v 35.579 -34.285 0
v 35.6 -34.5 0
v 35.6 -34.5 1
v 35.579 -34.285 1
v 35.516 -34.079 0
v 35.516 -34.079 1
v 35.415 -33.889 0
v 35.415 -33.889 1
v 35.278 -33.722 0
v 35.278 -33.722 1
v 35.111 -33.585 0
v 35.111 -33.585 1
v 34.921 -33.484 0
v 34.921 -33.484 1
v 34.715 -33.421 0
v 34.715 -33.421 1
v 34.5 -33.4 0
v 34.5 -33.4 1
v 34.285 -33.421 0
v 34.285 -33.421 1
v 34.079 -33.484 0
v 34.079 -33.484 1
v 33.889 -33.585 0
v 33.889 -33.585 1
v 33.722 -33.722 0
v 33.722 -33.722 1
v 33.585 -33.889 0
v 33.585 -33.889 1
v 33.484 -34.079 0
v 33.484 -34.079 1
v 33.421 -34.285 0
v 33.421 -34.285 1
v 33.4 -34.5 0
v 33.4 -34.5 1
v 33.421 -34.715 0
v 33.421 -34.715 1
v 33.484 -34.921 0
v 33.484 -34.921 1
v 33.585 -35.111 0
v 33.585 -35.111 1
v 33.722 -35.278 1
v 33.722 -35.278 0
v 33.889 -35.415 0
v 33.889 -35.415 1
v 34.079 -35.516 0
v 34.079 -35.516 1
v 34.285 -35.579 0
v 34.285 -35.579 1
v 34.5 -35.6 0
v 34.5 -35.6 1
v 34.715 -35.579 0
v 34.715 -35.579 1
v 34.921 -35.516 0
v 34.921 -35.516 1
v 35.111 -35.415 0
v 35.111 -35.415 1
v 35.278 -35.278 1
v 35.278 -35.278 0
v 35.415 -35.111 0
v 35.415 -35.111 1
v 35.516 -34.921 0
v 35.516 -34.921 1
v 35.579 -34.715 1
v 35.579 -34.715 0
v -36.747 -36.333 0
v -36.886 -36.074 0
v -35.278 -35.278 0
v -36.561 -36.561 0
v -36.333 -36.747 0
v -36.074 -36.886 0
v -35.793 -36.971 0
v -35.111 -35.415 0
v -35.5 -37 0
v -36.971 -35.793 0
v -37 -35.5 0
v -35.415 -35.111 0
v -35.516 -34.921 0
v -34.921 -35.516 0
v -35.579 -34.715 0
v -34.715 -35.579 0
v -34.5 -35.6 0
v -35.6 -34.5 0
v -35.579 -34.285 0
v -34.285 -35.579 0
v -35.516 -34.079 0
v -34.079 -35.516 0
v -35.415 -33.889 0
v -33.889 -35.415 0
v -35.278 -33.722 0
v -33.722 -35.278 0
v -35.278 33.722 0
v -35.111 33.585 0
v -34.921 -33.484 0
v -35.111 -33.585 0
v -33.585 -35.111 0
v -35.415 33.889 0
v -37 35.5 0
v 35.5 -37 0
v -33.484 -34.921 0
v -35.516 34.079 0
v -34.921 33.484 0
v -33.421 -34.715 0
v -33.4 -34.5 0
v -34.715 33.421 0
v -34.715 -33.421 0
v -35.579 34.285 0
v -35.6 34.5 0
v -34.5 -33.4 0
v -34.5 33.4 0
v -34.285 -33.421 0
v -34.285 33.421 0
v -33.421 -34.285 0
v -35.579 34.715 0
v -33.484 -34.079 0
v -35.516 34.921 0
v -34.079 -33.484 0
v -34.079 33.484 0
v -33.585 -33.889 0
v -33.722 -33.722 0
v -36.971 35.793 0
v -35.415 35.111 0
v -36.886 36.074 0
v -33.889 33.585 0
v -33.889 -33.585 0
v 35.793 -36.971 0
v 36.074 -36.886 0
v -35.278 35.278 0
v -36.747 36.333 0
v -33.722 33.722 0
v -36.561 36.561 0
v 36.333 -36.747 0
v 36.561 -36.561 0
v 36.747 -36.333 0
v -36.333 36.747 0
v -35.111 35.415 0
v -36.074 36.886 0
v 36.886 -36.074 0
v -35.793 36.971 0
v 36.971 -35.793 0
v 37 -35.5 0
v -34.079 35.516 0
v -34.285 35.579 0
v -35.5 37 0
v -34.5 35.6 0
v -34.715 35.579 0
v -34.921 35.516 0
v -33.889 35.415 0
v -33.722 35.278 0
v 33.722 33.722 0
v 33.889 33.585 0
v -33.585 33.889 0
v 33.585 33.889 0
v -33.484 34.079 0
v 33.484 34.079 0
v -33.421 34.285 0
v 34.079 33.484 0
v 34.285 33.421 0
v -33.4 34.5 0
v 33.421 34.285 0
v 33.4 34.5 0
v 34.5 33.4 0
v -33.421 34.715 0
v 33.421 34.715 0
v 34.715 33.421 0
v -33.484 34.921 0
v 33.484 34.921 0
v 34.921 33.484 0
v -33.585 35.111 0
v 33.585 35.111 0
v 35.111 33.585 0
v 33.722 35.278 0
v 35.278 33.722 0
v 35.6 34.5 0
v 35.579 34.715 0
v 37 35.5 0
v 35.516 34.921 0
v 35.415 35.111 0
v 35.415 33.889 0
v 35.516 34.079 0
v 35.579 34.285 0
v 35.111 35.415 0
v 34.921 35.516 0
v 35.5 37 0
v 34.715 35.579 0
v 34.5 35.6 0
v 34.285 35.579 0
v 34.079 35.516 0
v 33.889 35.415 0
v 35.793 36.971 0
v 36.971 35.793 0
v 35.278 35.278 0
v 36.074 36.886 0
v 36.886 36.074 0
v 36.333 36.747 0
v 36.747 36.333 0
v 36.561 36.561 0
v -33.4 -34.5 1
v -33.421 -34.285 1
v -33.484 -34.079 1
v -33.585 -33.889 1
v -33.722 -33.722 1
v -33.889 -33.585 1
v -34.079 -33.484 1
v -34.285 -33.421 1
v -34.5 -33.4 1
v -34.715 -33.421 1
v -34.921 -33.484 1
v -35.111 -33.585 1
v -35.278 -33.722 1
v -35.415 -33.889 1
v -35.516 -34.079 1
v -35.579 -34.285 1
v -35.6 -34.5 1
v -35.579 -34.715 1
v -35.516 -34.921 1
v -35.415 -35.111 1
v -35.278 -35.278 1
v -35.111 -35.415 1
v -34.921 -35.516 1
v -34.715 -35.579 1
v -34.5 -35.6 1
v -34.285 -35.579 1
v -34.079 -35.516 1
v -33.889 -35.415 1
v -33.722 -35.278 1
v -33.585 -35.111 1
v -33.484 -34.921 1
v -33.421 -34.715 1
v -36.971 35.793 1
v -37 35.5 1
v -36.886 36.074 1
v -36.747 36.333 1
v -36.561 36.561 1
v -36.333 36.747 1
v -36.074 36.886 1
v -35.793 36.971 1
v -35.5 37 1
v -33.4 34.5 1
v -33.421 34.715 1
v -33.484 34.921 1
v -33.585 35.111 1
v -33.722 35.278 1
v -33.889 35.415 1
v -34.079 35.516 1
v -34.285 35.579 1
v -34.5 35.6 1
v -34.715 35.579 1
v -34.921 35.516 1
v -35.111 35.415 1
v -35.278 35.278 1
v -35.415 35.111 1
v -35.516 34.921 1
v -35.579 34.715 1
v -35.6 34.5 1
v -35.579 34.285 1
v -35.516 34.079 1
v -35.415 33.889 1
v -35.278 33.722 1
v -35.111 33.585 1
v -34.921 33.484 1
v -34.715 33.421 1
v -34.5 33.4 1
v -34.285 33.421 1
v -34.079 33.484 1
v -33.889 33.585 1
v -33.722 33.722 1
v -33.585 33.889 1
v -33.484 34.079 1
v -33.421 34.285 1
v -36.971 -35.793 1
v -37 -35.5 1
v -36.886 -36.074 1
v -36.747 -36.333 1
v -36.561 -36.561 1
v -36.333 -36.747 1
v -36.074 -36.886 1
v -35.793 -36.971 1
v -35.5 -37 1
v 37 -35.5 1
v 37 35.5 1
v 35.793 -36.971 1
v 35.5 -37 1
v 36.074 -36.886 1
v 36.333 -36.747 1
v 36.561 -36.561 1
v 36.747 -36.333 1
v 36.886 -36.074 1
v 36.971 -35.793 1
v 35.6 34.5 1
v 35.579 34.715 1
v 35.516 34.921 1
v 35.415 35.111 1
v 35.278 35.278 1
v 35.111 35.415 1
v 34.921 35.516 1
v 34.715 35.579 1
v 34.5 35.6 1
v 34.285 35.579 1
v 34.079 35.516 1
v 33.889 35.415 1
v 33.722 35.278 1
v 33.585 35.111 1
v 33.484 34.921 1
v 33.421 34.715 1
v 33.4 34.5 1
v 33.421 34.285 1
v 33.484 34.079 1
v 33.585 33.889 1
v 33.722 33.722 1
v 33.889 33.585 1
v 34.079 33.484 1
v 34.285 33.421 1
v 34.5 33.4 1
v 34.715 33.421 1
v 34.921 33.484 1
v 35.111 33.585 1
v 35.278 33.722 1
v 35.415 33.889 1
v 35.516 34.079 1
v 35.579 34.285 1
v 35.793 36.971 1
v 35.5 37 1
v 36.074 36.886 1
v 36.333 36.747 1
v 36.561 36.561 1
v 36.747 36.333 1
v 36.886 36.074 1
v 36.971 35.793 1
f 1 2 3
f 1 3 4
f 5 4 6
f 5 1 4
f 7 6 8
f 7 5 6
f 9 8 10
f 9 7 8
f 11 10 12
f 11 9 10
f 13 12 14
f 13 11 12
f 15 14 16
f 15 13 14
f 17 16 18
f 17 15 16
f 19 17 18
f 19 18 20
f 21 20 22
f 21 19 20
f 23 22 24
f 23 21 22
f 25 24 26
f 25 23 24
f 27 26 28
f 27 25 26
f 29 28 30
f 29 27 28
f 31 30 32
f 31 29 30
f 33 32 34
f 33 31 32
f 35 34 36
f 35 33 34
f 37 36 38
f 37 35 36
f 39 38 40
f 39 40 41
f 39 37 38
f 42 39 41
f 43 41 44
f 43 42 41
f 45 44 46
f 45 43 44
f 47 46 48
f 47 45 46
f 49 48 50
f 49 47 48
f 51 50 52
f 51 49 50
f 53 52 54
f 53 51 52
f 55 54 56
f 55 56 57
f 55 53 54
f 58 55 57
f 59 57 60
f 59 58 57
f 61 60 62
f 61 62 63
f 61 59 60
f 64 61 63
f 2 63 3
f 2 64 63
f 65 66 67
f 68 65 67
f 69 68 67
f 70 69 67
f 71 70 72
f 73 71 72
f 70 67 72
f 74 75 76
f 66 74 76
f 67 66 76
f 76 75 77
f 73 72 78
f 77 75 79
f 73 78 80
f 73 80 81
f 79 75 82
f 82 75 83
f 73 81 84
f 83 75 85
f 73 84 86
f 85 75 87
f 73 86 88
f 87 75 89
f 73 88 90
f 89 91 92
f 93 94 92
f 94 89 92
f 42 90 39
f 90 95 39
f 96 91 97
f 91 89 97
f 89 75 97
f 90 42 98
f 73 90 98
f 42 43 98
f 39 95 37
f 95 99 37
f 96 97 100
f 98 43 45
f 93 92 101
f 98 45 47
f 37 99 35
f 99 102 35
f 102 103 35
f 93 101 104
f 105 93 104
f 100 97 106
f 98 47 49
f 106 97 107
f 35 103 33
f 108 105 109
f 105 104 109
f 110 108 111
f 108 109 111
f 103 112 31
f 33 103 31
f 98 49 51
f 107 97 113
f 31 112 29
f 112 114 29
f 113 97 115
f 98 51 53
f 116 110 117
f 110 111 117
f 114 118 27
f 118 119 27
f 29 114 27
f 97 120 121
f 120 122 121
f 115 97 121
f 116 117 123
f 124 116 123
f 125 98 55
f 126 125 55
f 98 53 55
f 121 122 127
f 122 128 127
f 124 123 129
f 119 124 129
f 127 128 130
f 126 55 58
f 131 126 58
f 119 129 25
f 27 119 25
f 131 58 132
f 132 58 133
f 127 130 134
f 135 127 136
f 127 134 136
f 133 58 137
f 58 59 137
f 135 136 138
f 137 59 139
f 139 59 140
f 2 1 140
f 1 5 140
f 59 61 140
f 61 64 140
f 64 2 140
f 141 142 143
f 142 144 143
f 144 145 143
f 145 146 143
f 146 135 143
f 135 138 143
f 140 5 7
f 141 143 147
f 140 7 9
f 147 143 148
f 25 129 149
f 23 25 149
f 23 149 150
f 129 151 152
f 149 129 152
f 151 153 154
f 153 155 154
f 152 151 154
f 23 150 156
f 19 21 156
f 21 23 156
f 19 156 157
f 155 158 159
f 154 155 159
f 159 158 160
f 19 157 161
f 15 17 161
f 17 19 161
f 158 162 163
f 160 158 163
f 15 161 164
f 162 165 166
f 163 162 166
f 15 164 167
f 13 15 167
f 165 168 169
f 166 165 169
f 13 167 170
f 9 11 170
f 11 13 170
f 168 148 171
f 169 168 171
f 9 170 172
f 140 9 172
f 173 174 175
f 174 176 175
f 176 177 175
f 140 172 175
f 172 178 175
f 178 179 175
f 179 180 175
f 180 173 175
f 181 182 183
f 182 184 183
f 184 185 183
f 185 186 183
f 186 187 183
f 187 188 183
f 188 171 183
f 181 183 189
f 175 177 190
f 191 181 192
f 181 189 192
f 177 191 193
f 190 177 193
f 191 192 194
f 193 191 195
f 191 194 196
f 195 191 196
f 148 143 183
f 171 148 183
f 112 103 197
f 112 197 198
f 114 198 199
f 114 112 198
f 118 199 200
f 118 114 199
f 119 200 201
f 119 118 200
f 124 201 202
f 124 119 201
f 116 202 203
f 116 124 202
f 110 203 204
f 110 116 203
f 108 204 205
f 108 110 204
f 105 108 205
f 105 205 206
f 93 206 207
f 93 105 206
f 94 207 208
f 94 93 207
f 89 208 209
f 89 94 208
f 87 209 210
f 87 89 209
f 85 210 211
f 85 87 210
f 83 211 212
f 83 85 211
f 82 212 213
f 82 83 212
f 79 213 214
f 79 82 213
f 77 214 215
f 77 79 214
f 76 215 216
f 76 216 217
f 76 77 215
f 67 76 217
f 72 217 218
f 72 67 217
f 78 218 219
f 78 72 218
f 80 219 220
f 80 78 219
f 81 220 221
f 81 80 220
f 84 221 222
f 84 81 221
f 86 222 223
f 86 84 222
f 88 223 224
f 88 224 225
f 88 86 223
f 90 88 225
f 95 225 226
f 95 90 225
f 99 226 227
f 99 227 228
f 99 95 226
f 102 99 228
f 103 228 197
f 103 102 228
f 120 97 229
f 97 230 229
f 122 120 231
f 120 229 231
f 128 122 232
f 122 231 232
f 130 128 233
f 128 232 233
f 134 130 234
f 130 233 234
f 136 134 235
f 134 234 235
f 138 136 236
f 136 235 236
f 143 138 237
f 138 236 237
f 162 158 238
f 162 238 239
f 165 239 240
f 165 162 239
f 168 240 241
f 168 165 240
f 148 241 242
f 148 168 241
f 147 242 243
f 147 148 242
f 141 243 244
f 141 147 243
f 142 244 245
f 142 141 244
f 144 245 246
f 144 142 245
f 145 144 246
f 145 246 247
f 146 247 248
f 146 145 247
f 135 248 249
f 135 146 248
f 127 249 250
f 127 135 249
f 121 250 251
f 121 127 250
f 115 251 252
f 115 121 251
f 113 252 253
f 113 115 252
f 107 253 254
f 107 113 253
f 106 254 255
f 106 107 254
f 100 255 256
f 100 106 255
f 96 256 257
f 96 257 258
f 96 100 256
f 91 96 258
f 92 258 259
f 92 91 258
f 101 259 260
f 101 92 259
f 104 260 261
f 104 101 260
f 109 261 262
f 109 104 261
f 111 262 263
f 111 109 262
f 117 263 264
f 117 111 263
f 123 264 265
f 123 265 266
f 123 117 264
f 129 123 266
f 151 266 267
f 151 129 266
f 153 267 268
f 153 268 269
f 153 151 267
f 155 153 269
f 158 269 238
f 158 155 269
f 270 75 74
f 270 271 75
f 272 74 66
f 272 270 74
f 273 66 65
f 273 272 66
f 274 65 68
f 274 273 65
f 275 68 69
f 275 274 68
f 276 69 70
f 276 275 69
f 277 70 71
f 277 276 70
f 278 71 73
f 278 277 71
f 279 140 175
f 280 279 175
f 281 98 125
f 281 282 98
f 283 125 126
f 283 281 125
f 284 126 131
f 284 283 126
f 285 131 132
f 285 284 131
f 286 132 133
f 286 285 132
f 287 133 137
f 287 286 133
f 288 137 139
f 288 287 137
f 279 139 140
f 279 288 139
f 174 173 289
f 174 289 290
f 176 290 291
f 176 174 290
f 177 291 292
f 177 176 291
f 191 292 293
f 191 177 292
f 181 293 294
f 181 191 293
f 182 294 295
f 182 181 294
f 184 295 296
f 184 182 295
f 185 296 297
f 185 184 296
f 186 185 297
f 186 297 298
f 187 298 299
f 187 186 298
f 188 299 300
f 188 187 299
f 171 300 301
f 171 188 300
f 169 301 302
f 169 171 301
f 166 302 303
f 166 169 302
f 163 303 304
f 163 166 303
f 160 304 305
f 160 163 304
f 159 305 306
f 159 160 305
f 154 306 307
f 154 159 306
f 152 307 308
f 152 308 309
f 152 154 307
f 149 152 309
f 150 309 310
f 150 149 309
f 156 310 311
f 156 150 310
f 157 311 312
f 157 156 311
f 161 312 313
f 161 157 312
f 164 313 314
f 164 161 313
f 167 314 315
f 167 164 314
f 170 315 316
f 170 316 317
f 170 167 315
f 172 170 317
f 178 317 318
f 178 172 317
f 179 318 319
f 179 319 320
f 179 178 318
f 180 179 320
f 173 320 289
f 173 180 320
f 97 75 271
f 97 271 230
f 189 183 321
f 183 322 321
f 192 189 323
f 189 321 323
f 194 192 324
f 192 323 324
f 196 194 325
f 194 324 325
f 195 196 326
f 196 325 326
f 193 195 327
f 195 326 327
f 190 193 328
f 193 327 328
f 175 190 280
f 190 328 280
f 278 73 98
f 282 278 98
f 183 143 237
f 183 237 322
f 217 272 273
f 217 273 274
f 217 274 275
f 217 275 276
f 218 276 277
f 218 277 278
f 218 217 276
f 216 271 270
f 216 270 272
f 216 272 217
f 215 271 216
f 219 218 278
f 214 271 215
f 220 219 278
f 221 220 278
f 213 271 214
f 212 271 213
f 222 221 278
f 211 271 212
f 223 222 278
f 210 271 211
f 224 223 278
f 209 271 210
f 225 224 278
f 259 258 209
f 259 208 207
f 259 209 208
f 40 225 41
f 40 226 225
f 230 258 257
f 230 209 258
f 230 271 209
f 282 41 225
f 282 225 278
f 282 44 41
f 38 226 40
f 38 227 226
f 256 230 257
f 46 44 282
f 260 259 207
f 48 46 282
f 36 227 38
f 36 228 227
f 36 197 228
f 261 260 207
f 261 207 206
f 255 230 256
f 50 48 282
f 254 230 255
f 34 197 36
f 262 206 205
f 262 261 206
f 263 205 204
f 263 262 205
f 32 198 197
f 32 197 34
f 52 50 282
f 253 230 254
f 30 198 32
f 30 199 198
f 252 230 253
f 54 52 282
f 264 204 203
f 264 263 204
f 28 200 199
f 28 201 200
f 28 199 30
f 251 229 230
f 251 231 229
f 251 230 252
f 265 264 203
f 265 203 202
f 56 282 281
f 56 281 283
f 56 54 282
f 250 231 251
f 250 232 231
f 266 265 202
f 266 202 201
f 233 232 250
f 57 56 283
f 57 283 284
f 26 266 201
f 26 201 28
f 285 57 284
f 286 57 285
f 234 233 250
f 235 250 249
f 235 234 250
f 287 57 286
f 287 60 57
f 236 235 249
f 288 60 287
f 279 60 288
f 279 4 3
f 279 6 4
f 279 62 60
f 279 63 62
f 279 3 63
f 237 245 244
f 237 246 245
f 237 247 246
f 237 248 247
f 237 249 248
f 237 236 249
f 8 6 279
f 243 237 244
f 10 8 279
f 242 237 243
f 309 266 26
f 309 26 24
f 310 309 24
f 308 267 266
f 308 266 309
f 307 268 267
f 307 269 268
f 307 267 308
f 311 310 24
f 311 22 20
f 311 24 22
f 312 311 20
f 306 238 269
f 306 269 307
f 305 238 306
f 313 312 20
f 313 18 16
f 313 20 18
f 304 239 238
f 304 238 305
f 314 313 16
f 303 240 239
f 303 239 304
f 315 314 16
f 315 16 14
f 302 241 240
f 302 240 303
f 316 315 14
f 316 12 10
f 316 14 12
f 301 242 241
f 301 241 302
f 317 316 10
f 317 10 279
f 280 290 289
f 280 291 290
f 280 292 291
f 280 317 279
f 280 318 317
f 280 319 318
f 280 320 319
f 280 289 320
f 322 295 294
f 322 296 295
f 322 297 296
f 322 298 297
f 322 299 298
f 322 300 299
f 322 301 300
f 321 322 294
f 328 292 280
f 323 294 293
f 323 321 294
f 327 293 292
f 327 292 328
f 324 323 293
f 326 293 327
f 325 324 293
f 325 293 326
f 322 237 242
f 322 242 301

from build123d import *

# Parameters (mm, degrees)
SKETCH_1_W      = 74
SKETCH_1_H      = 74
SKETCH_1_R      = 1.1
EXTRUDE_1_DEPTH = 1
FILLET_1_R      = 1.5


with BuildPart() as part:
    # 草图1 → 凸台-拉伸1 (new body)
    with BuildSketch(Plane.XY):
        Rectangle(SKETCH_1_W, SKETCH_1_H)
        with Locations((-34.5, 34.5)):
            Circle(SKETCH_1_R, mode=Mode.SUBTRACT)
        with Locations((34.5, 34.5)):
            Circle(SKETCH_1_R, mode=Mode.SUBTRACT)
        with Locations((34.5, -34.5)):
            Circle(SKETCH_1_R, mode=Mode.SUBTRACT)
        with Locations((-34.5, -34.5)):
            Circle(SKETCH_1_R, mode=Mode.SUBTRACT)
    extrude(amount=EXTRUDE_1_DEPTH)

    # 圆角1
    fillet_1_edges = [part.edges().sort_by_distance(p)[0] for p in [
        (37, -37, 0.5),
        (-37, -37, 0.5),
        (-37, 37, 0.5),
        (37, 37, 0.5),
    ]]
    fillet(fillet_1_edges, radius=FILLET_1_R)


solid = part.part
